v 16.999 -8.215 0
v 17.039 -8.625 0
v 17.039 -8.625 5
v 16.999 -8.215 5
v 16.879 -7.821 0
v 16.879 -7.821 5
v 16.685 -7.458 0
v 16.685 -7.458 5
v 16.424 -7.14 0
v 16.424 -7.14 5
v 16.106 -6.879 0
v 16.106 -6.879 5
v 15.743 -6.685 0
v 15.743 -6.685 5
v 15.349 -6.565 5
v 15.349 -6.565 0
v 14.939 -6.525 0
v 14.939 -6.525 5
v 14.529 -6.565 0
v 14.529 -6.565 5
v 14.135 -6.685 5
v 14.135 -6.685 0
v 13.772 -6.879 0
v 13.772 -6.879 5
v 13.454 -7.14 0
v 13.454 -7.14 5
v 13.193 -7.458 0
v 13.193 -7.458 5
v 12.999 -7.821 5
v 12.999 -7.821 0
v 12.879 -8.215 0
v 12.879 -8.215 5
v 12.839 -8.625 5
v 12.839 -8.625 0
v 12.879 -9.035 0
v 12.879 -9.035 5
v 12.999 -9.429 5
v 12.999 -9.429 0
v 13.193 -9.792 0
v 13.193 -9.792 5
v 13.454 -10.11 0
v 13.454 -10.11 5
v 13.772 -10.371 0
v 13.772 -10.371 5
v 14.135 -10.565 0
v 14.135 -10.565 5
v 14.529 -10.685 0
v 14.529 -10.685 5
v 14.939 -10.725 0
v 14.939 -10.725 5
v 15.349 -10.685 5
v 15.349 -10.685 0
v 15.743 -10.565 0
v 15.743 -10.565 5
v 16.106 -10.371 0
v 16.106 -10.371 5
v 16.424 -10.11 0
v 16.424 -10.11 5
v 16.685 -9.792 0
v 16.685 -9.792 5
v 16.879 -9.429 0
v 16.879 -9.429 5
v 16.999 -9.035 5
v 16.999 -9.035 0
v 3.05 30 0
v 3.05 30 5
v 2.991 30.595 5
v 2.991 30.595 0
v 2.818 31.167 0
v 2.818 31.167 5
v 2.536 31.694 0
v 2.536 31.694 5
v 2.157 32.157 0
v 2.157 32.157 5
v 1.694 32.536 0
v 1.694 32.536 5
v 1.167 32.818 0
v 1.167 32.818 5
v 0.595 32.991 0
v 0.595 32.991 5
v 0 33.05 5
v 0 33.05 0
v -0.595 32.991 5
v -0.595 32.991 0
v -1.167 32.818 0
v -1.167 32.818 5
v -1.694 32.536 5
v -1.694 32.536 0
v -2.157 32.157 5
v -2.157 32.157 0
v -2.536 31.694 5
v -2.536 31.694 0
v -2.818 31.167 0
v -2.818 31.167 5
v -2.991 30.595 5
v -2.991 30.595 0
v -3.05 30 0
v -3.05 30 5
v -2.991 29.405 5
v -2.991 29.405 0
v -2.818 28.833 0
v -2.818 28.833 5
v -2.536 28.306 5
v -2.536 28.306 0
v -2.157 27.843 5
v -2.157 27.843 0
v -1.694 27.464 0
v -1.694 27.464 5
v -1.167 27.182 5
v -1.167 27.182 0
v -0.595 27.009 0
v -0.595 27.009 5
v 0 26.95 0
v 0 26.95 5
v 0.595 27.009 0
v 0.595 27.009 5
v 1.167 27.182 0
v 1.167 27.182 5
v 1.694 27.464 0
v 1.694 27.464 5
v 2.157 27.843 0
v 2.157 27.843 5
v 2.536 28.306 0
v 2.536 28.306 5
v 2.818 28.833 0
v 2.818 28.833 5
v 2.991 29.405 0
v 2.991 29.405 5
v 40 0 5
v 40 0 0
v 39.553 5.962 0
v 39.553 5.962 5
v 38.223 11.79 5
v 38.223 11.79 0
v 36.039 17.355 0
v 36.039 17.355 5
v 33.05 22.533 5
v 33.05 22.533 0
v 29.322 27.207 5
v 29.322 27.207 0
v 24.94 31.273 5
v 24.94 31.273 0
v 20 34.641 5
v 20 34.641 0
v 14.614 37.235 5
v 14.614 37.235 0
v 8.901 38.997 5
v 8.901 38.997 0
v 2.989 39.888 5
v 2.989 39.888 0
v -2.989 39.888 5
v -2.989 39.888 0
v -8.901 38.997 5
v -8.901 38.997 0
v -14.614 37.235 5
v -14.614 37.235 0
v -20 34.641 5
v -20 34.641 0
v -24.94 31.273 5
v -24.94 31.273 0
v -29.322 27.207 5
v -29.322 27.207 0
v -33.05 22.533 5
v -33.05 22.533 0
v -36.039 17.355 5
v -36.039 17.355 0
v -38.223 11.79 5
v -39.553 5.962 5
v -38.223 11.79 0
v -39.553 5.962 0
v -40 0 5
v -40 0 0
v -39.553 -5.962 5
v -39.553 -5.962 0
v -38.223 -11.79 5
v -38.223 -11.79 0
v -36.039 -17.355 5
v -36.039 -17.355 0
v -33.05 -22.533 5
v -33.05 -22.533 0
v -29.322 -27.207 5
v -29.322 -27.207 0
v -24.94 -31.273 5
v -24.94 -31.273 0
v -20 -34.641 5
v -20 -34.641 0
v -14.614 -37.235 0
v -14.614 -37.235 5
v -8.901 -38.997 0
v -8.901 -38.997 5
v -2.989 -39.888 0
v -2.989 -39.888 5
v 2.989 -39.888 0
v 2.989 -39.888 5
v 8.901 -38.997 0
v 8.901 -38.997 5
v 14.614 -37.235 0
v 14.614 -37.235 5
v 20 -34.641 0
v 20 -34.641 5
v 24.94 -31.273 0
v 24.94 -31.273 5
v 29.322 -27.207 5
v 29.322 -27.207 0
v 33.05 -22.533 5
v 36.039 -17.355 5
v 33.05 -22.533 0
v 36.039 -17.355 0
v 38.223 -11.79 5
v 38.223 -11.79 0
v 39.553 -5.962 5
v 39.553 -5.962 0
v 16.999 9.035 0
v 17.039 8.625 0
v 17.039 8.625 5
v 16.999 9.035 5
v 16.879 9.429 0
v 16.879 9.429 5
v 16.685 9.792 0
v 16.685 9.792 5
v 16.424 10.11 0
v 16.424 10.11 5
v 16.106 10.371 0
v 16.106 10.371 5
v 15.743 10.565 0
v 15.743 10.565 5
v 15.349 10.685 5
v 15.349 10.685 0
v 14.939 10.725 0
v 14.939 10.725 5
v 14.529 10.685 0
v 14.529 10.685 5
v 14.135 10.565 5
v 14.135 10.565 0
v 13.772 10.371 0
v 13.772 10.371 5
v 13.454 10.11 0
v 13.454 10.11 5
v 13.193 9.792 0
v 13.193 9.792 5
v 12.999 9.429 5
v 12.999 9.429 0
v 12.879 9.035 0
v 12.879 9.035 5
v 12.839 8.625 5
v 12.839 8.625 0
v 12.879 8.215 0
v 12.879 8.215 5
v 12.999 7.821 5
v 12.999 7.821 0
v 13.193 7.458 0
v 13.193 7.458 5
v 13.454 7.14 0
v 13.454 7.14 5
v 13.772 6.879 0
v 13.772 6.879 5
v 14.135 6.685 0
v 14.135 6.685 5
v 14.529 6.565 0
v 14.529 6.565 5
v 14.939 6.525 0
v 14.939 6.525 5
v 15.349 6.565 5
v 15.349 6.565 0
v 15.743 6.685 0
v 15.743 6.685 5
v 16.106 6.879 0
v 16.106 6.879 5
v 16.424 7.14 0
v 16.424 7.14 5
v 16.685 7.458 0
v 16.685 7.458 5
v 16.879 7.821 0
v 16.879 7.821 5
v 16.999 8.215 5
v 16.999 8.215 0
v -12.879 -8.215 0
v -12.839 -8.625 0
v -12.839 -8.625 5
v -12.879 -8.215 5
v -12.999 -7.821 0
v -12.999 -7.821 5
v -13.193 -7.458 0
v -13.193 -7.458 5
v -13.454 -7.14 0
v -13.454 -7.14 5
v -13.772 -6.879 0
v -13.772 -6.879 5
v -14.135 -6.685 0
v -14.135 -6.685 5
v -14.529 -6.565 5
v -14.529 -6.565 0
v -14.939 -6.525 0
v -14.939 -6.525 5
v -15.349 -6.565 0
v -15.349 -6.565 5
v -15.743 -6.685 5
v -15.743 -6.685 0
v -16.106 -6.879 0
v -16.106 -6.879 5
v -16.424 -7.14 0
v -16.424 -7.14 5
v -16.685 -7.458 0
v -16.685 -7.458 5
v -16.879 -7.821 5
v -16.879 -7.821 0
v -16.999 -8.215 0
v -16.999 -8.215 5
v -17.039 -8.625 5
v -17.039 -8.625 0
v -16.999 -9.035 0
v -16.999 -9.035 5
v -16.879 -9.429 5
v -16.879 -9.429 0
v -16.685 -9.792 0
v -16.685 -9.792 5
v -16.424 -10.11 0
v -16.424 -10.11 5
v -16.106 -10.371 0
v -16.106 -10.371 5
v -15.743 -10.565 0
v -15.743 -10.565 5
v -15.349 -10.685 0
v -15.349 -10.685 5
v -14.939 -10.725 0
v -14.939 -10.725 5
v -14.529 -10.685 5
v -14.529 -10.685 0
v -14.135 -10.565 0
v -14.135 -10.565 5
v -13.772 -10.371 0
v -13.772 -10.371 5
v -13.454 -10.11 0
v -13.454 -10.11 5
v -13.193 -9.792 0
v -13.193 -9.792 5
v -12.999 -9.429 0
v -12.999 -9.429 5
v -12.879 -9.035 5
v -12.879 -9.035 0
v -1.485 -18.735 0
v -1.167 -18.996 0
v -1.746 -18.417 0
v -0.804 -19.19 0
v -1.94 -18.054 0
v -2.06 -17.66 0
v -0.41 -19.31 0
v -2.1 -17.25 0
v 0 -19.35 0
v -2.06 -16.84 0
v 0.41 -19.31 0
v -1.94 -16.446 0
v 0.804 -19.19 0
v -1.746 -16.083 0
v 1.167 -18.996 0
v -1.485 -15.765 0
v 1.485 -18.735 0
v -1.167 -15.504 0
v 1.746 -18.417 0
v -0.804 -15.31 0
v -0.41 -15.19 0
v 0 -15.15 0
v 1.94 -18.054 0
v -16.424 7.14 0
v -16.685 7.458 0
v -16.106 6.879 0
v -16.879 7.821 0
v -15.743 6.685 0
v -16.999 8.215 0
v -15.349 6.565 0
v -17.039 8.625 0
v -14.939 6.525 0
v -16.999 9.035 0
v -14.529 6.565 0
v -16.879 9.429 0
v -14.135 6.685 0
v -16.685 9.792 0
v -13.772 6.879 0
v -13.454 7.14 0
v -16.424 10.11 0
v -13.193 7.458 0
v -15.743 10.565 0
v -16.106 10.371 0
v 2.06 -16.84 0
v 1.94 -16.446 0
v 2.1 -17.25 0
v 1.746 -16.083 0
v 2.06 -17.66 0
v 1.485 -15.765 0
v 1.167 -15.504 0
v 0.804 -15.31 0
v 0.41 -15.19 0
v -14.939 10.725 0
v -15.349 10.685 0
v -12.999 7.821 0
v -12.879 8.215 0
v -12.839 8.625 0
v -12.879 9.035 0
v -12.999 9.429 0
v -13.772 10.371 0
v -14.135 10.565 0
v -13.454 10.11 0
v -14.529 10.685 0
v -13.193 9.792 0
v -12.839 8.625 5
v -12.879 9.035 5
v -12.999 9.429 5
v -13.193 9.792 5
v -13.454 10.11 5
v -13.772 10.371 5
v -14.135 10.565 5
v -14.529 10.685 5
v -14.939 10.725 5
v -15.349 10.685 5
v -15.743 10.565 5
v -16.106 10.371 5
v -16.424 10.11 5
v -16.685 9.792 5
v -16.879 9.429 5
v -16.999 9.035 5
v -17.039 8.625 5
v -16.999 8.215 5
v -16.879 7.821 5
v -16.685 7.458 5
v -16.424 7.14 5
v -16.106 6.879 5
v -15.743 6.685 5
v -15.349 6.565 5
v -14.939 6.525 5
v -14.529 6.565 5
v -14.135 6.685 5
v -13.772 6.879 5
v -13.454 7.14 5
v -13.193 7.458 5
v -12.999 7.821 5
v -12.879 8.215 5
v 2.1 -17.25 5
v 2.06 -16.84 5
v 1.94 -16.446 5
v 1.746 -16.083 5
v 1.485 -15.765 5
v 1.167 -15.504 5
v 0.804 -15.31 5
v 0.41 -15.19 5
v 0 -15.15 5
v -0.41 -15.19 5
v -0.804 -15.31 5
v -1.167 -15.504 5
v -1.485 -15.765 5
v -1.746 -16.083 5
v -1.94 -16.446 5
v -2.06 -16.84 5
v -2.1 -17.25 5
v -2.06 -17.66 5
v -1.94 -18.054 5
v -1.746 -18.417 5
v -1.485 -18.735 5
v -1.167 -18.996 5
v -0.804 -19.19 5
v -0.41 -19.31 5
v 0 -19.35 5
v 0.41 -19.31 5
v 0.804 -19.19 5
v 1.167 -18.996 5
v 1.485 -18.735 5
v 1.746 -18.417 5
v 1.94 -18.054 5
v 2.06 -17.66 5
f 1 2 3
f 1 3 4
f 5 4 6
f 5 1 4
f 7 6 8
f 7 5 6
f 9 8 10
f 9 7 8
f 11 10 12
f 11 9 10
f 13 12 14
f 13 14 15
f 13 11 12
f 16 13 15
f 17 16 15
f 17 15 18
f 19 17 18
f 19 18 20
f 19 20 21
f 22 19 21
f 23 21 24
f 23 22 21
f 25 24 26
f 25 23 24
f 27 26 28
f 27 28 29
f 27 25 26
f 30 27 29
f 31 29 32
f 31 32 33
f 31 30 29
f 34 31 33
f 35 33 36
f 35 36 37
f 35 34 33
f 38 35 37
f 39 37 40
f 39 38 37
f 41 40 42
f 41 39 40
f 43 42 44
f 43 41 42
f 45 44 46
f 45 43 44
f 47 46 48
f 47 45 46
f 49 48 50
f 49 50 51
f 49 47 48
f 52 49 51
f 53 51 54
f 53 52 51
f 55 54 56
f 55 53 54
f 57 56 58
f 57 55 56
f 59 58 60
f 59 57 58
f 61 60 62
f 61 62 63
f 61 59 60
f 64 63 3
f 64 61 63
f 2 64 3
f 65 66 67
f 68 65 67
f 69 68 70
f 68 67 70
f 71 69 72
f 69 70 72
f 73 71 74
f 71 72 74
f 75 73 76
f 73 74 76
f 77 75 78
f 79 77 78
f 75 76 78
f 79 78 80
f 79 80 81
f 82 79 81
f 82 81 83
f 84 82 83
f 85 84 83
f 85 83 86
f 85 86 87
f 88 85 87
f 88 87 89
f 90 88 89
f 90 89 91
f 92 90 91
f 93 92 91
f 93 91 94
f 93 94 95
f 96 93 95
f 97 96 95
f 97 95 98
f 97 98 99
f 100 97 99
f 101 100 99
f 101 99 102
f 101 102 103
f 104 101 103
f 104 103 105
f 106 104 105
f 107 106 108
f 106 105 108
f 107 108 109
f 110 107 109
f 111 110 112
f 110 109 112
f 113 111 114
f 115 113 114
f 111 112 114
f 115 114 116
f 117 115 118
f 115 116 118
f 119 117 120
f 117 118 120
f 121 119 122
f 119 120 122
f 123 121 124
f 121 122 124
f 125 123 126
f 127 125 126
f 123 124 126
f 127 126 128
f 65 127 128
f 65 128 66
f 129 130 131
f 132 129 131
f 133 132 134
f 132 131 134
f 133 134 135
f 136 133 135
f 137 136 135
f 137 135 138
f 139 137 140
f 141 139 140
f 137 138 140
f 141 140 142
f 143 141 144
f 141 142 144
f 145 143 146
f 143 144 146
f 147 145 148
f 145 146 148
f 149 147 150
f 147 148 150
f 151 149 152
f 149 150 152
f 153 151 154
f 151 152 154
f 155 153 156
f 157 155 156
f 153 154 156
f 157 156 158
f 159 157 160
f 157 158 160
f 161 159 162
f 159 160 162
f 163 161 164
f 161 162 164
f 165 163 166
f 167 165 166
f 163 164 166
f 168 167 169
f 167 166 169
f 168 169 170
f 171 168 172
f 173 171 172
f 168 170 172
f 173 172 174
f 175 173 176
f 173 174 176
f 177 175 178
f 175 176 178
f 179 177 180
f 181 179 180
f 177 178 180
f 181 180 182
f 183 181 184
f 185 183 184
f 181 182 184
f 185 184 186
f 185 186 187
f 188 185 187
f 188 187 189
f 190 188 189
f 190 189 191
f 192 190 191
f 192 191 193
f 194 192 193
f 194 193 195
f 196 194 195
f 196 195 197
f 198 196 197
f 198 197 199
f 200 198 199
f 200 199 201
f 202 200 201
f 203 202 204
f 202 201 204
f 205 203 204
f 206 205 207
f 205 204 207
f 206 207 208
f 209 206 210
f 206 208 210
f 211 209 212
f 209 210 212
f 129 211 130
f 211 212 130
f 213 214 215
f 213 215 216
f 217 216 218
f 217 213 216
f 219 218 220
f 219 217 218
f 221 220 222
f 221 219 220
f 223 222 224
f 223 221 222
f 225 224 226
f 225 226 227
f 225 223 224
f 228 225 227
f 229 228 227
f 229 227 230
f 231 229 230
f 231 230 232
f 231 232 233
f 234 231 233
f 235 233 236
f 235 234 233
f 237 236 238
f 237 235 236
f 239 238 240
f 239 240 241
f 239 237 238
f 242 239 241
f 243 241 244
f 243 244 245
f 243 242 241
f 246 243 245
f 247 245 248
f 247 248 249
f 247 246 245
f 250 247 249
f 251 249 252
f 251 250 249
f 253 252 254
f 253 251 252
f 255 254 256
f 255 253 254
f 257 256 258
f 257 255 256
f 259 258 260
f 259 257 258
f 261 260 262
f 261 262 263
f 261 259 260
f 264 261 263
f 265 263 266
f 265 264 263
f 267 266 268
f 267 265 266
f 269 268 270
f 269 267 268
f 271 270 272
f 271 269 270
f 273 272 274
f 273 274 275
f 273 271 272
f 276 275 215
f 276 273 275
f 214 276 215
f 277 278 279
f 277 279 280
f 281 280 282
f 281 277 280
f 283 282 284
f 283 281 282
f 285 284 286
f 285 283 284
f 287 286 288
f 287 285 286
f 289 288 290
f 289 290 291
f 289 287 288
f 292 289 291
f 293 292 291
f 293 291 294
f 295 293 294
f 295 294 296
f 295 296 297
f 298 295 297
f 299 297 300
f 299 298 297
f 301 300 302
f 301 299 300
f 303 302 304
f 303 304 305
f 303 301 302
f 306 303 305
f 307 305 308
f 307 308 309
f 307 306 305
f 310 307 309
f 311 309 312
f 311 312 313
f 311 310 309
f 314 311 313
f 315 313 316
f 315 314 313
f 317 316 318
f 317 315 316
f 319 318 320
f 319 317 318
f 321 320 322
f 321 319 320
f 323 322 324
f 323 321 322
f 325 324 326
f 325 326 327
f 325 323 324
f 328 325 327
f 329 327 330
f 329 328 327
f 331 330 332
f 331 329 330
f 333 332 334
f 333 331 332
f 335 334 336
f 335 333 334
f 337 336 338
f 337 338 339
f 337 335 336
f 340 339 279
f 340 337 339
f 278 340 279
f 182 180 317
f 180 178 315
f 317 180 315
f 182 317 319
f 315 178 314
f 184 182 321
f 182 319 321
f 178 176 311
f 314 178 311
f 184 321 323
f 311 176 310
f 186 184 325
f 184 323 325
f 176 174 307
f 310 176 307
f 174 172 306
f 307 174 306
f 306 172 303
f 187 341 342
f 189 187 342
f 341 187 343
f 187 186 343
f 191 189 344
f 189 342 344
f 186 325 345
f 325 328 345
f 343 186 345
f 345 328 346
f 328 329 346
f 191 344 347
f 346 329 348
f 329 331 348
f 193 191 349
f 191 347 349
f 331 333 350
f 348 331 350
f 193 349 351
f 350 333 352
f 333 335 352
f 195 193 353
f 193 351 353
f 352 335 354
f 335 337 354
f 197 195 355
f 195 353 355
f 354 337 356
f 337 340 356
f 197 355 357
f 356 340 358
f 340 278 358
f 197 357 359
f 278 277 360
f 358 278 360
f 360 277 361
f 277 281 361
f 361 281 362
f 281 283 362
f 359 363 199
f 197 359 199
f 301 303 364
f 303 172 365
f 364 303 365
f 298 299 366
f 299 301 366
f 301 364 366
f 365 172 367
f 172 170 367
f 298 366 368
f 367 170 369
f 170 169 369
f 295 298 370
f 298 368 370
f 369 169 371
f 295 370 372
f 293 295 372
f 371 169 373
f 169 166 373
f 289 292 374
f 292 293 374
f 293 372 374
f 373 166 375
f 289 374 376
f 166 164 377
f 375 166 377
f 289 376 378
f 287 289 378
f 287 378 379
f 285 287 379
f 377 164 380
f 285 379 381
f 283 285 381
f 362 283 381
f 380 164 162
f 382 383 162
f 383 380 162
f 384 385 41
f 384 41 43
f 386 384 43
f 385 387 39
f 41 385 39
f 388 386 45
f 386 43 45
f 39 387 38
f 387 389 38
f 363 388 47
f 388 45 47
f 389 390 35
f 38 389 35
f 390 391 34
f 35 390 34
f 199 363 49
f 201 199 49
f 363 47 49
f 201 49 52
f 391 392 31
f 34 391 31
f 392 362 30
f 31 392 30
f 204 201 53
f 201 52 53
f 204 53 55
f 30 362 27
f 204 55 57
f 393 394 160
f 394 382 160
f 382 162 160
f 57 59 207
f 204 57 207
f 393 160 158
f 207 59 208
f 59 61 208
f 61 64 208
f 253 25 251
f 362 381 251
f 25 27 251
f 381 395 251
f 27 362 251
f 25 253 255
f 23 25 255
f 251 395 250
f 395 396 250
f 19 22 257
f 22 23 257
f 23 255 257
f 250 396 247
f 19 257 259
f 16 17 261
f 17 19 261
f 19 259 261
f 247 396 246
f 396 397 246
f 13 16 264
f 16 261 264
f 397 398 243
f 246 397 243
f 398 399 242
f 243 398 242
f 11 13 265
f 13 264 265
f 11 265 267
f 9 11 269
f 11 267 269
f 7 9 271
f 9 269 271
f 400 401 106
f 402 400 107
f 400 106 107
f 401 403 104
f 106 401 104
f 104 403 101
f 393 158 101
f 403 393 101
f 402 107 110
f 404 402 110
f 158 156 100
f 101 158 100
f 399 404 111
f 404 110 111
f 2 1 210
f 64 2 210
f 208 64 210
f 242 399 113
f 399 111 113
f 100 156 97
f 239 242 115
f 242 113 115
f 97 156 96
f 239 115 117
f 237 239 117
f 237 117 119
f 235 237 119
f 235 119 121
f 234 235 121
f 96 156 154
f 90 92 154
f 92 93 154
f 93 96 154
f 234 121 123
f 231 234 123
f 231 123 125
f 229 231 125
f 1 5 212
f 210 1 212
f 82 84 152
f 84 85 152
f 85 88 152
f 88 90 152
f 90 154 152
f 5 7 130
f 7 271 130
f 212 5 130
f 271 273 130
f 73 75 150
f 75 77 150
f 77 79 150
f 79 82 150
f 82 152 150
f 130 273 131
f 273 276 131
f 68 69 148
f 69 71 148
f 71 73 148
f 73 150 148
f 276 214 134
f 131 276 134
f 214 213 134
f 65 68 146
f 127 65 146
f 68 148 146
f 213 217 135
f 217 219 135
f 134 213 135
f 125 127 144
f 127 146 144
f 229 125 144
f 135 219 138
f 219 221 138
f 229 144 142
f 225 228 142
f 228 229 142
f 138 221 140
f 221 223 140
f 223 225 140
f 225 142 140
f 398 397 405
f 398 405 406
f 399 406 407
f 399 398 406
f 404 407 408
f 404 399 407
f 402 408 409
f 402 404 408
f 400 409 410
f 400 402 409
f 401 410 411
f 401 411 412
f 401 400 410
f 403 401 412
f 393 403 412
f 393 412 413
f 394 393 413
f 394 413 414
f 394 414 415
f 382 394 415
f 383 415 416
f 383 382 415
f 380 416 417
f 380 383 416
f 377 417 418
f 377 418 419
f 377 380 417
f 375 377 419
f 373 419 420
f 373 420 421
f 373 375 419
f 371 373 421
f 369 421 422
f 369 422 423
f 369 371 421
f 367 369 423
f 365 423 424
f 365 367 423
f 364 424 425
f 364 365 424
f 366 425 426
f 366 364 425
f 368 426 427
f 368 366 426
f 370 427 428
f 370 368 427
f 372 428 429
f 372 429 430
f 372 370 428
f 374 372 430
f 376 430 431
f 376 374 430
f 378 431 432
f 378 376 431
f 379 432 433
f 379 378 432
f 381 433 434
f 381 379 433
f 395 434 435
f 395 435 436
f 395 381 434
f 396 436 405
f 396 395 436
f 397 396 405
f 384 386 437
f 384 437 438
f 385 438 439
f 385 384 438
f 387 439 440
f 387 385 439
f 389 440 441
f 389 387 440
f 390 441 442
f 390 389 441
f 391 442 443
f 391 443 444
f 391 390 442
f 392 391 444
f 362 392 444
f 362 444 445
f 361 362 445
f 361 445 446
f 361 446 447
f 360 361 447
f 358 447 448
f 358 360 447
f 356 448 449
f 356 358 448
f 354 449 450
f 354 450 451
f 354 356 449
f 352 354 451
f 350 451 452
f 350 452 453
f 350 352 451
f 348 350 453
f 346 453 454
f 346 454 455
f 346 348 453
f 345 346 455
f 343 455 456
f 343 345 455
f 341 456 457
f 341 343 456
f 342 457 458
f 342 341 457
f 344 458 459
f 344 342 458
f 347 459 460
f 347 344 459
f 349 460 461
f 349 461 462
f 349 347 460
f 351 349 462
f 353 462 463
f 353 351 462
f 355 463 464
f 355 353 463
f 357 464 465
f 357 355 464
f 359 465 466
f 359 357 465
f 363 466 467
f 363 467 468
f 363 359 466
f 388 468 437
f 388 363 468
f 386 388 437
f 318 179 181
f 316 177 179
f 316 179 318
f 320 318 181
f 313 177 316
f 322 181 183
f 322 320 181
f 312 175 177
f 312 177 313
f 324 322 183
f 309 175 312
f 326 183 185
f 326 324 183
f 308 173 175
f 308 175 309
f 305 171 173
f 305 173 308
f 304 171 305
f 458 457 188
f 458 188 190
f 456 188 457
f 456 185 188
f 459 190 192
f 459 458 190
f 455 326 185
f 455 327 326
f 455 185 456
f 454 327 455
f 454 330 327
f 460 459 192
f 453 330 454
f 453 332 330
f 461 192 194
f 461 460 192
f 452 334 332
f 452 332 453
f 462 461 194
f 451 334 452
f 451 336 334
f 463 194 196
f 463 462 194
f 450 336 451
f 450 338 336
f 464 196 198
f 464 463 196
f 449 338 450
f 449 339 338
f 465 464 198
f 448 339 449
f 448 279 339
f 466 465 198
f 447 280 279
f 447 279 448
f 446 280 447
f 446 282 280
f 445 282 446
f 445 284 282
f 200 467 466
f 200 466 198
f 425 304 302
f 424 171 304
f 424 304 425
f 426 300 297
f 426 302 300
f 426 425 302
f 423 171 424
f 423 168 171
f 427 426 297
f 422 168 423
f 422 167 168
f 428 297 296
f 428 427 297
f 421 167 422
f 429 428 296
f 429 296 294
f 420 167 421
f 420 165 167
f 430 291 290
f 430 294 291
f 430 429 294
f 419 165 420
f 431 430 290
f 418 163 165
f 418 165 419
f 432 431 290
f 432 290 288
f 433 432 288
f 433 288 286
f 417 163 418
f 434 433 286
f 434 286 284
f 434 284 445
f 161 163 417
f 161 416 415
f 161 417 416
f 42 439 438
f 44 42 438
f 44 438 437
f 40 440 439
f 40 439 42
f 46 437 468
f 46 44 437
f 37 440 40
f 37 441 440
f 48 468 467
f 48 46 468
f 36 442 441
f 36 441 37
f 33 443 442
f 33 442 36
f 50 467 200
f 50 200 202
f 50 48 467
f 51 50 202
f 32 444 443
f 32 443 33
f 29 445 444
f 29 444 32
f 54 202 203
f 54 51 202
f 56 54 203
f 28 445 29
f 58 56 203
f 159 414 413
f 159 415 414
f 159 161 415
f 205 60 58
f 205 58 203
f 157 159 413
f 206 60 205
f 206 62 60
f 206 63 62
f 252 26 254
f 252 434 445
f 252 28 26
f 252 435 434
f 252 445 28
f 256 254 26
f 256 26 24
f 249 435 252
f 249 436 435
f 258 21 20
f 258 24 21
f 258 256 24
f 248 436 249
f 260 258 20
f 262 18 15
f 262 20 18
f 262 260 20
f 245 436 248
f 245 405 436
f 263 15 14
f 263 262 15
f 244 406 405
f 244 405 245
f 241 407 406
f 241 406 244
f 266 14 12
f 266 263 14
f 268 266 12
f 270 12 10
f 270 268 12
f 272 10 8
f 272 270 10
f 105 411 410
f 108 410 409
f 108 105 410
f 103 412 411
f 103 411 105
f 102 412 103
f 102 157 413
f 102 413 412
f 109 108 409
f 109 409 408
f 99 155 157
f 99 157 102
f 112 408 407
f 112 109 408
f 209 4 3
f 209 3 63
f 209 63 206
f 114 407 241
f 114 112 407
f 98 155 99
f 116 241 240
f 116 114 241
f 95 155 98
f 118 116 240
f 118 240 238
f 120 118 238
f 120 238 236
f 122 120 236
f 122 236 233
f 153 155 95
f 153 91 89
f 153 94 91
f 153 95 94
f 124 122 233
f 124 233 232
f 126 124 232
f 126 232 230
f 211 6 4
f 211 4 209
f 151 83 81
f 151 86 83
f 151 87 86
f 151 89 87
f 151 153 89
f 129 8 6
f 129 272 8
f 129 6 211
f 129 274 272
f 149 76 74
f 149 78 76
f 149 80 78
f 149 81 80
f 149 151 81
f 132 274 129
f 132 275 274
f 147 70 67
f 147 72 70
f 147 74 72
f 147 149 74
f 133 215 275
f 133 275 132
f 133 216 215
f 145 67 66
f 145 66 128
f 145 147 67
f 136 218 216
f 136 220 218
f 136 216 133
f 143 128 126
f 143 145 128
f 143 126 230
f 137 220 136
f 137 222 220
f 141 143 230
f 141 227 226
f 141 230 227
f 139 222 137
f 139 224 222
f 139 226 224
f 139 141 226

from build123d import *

# Parameters (mm, degrees)
SKETCH_1_R          = 40
SKETCH_1_R_2        = 2.1
EXTRUDE_1_DEPTH     = 5
SKETCH_2_R          = 3.05
CUT_EXTRUDE_2_DEPTH = 10


with BuildPart() as part:
    # 草图1 → 凸台-拉伸1 (new body)
    with BuildSketch(Plane.XY):
        Circle(SKETCH_1_R)
        with Locations((14.938938215, 8.625)):
            Circle(SKETCH_1_R_2, mode=Mode.SUBTRACT)
        with Locations((14.938938215, -8.625)):
            Circle(SKETCH_1_R_2, mode=Mode.SUBTRACT)
        with Locations((0, -17.25)):
            Circle(SKETCH_1_R_2, mode=Mode.SUBTRACT)
        with Locations((-14.938938215, -8.625)):
            Circle(SKETCH_1_R_2, mode=Mode.SUBTRACT)
        with Locations((-14.938938215, 8.625)):
            Circle(SKETCH_1_R_2, mode=Mode.SUBTRACT)
    extrude(amount=EXTRUDE_1_DEPTH)

    # 草图2 → 切除-拉伸2 (cut)
    with BuildSketch(Plane.XY.offset(5)):
        with Locations((0, 30)):
            Circle(SKETCH_2_R)
    extrude(amount=-CUT_EXTRUDE_2_DEPTH, mode=Mode.SUBTRACT)


solid = part.part
